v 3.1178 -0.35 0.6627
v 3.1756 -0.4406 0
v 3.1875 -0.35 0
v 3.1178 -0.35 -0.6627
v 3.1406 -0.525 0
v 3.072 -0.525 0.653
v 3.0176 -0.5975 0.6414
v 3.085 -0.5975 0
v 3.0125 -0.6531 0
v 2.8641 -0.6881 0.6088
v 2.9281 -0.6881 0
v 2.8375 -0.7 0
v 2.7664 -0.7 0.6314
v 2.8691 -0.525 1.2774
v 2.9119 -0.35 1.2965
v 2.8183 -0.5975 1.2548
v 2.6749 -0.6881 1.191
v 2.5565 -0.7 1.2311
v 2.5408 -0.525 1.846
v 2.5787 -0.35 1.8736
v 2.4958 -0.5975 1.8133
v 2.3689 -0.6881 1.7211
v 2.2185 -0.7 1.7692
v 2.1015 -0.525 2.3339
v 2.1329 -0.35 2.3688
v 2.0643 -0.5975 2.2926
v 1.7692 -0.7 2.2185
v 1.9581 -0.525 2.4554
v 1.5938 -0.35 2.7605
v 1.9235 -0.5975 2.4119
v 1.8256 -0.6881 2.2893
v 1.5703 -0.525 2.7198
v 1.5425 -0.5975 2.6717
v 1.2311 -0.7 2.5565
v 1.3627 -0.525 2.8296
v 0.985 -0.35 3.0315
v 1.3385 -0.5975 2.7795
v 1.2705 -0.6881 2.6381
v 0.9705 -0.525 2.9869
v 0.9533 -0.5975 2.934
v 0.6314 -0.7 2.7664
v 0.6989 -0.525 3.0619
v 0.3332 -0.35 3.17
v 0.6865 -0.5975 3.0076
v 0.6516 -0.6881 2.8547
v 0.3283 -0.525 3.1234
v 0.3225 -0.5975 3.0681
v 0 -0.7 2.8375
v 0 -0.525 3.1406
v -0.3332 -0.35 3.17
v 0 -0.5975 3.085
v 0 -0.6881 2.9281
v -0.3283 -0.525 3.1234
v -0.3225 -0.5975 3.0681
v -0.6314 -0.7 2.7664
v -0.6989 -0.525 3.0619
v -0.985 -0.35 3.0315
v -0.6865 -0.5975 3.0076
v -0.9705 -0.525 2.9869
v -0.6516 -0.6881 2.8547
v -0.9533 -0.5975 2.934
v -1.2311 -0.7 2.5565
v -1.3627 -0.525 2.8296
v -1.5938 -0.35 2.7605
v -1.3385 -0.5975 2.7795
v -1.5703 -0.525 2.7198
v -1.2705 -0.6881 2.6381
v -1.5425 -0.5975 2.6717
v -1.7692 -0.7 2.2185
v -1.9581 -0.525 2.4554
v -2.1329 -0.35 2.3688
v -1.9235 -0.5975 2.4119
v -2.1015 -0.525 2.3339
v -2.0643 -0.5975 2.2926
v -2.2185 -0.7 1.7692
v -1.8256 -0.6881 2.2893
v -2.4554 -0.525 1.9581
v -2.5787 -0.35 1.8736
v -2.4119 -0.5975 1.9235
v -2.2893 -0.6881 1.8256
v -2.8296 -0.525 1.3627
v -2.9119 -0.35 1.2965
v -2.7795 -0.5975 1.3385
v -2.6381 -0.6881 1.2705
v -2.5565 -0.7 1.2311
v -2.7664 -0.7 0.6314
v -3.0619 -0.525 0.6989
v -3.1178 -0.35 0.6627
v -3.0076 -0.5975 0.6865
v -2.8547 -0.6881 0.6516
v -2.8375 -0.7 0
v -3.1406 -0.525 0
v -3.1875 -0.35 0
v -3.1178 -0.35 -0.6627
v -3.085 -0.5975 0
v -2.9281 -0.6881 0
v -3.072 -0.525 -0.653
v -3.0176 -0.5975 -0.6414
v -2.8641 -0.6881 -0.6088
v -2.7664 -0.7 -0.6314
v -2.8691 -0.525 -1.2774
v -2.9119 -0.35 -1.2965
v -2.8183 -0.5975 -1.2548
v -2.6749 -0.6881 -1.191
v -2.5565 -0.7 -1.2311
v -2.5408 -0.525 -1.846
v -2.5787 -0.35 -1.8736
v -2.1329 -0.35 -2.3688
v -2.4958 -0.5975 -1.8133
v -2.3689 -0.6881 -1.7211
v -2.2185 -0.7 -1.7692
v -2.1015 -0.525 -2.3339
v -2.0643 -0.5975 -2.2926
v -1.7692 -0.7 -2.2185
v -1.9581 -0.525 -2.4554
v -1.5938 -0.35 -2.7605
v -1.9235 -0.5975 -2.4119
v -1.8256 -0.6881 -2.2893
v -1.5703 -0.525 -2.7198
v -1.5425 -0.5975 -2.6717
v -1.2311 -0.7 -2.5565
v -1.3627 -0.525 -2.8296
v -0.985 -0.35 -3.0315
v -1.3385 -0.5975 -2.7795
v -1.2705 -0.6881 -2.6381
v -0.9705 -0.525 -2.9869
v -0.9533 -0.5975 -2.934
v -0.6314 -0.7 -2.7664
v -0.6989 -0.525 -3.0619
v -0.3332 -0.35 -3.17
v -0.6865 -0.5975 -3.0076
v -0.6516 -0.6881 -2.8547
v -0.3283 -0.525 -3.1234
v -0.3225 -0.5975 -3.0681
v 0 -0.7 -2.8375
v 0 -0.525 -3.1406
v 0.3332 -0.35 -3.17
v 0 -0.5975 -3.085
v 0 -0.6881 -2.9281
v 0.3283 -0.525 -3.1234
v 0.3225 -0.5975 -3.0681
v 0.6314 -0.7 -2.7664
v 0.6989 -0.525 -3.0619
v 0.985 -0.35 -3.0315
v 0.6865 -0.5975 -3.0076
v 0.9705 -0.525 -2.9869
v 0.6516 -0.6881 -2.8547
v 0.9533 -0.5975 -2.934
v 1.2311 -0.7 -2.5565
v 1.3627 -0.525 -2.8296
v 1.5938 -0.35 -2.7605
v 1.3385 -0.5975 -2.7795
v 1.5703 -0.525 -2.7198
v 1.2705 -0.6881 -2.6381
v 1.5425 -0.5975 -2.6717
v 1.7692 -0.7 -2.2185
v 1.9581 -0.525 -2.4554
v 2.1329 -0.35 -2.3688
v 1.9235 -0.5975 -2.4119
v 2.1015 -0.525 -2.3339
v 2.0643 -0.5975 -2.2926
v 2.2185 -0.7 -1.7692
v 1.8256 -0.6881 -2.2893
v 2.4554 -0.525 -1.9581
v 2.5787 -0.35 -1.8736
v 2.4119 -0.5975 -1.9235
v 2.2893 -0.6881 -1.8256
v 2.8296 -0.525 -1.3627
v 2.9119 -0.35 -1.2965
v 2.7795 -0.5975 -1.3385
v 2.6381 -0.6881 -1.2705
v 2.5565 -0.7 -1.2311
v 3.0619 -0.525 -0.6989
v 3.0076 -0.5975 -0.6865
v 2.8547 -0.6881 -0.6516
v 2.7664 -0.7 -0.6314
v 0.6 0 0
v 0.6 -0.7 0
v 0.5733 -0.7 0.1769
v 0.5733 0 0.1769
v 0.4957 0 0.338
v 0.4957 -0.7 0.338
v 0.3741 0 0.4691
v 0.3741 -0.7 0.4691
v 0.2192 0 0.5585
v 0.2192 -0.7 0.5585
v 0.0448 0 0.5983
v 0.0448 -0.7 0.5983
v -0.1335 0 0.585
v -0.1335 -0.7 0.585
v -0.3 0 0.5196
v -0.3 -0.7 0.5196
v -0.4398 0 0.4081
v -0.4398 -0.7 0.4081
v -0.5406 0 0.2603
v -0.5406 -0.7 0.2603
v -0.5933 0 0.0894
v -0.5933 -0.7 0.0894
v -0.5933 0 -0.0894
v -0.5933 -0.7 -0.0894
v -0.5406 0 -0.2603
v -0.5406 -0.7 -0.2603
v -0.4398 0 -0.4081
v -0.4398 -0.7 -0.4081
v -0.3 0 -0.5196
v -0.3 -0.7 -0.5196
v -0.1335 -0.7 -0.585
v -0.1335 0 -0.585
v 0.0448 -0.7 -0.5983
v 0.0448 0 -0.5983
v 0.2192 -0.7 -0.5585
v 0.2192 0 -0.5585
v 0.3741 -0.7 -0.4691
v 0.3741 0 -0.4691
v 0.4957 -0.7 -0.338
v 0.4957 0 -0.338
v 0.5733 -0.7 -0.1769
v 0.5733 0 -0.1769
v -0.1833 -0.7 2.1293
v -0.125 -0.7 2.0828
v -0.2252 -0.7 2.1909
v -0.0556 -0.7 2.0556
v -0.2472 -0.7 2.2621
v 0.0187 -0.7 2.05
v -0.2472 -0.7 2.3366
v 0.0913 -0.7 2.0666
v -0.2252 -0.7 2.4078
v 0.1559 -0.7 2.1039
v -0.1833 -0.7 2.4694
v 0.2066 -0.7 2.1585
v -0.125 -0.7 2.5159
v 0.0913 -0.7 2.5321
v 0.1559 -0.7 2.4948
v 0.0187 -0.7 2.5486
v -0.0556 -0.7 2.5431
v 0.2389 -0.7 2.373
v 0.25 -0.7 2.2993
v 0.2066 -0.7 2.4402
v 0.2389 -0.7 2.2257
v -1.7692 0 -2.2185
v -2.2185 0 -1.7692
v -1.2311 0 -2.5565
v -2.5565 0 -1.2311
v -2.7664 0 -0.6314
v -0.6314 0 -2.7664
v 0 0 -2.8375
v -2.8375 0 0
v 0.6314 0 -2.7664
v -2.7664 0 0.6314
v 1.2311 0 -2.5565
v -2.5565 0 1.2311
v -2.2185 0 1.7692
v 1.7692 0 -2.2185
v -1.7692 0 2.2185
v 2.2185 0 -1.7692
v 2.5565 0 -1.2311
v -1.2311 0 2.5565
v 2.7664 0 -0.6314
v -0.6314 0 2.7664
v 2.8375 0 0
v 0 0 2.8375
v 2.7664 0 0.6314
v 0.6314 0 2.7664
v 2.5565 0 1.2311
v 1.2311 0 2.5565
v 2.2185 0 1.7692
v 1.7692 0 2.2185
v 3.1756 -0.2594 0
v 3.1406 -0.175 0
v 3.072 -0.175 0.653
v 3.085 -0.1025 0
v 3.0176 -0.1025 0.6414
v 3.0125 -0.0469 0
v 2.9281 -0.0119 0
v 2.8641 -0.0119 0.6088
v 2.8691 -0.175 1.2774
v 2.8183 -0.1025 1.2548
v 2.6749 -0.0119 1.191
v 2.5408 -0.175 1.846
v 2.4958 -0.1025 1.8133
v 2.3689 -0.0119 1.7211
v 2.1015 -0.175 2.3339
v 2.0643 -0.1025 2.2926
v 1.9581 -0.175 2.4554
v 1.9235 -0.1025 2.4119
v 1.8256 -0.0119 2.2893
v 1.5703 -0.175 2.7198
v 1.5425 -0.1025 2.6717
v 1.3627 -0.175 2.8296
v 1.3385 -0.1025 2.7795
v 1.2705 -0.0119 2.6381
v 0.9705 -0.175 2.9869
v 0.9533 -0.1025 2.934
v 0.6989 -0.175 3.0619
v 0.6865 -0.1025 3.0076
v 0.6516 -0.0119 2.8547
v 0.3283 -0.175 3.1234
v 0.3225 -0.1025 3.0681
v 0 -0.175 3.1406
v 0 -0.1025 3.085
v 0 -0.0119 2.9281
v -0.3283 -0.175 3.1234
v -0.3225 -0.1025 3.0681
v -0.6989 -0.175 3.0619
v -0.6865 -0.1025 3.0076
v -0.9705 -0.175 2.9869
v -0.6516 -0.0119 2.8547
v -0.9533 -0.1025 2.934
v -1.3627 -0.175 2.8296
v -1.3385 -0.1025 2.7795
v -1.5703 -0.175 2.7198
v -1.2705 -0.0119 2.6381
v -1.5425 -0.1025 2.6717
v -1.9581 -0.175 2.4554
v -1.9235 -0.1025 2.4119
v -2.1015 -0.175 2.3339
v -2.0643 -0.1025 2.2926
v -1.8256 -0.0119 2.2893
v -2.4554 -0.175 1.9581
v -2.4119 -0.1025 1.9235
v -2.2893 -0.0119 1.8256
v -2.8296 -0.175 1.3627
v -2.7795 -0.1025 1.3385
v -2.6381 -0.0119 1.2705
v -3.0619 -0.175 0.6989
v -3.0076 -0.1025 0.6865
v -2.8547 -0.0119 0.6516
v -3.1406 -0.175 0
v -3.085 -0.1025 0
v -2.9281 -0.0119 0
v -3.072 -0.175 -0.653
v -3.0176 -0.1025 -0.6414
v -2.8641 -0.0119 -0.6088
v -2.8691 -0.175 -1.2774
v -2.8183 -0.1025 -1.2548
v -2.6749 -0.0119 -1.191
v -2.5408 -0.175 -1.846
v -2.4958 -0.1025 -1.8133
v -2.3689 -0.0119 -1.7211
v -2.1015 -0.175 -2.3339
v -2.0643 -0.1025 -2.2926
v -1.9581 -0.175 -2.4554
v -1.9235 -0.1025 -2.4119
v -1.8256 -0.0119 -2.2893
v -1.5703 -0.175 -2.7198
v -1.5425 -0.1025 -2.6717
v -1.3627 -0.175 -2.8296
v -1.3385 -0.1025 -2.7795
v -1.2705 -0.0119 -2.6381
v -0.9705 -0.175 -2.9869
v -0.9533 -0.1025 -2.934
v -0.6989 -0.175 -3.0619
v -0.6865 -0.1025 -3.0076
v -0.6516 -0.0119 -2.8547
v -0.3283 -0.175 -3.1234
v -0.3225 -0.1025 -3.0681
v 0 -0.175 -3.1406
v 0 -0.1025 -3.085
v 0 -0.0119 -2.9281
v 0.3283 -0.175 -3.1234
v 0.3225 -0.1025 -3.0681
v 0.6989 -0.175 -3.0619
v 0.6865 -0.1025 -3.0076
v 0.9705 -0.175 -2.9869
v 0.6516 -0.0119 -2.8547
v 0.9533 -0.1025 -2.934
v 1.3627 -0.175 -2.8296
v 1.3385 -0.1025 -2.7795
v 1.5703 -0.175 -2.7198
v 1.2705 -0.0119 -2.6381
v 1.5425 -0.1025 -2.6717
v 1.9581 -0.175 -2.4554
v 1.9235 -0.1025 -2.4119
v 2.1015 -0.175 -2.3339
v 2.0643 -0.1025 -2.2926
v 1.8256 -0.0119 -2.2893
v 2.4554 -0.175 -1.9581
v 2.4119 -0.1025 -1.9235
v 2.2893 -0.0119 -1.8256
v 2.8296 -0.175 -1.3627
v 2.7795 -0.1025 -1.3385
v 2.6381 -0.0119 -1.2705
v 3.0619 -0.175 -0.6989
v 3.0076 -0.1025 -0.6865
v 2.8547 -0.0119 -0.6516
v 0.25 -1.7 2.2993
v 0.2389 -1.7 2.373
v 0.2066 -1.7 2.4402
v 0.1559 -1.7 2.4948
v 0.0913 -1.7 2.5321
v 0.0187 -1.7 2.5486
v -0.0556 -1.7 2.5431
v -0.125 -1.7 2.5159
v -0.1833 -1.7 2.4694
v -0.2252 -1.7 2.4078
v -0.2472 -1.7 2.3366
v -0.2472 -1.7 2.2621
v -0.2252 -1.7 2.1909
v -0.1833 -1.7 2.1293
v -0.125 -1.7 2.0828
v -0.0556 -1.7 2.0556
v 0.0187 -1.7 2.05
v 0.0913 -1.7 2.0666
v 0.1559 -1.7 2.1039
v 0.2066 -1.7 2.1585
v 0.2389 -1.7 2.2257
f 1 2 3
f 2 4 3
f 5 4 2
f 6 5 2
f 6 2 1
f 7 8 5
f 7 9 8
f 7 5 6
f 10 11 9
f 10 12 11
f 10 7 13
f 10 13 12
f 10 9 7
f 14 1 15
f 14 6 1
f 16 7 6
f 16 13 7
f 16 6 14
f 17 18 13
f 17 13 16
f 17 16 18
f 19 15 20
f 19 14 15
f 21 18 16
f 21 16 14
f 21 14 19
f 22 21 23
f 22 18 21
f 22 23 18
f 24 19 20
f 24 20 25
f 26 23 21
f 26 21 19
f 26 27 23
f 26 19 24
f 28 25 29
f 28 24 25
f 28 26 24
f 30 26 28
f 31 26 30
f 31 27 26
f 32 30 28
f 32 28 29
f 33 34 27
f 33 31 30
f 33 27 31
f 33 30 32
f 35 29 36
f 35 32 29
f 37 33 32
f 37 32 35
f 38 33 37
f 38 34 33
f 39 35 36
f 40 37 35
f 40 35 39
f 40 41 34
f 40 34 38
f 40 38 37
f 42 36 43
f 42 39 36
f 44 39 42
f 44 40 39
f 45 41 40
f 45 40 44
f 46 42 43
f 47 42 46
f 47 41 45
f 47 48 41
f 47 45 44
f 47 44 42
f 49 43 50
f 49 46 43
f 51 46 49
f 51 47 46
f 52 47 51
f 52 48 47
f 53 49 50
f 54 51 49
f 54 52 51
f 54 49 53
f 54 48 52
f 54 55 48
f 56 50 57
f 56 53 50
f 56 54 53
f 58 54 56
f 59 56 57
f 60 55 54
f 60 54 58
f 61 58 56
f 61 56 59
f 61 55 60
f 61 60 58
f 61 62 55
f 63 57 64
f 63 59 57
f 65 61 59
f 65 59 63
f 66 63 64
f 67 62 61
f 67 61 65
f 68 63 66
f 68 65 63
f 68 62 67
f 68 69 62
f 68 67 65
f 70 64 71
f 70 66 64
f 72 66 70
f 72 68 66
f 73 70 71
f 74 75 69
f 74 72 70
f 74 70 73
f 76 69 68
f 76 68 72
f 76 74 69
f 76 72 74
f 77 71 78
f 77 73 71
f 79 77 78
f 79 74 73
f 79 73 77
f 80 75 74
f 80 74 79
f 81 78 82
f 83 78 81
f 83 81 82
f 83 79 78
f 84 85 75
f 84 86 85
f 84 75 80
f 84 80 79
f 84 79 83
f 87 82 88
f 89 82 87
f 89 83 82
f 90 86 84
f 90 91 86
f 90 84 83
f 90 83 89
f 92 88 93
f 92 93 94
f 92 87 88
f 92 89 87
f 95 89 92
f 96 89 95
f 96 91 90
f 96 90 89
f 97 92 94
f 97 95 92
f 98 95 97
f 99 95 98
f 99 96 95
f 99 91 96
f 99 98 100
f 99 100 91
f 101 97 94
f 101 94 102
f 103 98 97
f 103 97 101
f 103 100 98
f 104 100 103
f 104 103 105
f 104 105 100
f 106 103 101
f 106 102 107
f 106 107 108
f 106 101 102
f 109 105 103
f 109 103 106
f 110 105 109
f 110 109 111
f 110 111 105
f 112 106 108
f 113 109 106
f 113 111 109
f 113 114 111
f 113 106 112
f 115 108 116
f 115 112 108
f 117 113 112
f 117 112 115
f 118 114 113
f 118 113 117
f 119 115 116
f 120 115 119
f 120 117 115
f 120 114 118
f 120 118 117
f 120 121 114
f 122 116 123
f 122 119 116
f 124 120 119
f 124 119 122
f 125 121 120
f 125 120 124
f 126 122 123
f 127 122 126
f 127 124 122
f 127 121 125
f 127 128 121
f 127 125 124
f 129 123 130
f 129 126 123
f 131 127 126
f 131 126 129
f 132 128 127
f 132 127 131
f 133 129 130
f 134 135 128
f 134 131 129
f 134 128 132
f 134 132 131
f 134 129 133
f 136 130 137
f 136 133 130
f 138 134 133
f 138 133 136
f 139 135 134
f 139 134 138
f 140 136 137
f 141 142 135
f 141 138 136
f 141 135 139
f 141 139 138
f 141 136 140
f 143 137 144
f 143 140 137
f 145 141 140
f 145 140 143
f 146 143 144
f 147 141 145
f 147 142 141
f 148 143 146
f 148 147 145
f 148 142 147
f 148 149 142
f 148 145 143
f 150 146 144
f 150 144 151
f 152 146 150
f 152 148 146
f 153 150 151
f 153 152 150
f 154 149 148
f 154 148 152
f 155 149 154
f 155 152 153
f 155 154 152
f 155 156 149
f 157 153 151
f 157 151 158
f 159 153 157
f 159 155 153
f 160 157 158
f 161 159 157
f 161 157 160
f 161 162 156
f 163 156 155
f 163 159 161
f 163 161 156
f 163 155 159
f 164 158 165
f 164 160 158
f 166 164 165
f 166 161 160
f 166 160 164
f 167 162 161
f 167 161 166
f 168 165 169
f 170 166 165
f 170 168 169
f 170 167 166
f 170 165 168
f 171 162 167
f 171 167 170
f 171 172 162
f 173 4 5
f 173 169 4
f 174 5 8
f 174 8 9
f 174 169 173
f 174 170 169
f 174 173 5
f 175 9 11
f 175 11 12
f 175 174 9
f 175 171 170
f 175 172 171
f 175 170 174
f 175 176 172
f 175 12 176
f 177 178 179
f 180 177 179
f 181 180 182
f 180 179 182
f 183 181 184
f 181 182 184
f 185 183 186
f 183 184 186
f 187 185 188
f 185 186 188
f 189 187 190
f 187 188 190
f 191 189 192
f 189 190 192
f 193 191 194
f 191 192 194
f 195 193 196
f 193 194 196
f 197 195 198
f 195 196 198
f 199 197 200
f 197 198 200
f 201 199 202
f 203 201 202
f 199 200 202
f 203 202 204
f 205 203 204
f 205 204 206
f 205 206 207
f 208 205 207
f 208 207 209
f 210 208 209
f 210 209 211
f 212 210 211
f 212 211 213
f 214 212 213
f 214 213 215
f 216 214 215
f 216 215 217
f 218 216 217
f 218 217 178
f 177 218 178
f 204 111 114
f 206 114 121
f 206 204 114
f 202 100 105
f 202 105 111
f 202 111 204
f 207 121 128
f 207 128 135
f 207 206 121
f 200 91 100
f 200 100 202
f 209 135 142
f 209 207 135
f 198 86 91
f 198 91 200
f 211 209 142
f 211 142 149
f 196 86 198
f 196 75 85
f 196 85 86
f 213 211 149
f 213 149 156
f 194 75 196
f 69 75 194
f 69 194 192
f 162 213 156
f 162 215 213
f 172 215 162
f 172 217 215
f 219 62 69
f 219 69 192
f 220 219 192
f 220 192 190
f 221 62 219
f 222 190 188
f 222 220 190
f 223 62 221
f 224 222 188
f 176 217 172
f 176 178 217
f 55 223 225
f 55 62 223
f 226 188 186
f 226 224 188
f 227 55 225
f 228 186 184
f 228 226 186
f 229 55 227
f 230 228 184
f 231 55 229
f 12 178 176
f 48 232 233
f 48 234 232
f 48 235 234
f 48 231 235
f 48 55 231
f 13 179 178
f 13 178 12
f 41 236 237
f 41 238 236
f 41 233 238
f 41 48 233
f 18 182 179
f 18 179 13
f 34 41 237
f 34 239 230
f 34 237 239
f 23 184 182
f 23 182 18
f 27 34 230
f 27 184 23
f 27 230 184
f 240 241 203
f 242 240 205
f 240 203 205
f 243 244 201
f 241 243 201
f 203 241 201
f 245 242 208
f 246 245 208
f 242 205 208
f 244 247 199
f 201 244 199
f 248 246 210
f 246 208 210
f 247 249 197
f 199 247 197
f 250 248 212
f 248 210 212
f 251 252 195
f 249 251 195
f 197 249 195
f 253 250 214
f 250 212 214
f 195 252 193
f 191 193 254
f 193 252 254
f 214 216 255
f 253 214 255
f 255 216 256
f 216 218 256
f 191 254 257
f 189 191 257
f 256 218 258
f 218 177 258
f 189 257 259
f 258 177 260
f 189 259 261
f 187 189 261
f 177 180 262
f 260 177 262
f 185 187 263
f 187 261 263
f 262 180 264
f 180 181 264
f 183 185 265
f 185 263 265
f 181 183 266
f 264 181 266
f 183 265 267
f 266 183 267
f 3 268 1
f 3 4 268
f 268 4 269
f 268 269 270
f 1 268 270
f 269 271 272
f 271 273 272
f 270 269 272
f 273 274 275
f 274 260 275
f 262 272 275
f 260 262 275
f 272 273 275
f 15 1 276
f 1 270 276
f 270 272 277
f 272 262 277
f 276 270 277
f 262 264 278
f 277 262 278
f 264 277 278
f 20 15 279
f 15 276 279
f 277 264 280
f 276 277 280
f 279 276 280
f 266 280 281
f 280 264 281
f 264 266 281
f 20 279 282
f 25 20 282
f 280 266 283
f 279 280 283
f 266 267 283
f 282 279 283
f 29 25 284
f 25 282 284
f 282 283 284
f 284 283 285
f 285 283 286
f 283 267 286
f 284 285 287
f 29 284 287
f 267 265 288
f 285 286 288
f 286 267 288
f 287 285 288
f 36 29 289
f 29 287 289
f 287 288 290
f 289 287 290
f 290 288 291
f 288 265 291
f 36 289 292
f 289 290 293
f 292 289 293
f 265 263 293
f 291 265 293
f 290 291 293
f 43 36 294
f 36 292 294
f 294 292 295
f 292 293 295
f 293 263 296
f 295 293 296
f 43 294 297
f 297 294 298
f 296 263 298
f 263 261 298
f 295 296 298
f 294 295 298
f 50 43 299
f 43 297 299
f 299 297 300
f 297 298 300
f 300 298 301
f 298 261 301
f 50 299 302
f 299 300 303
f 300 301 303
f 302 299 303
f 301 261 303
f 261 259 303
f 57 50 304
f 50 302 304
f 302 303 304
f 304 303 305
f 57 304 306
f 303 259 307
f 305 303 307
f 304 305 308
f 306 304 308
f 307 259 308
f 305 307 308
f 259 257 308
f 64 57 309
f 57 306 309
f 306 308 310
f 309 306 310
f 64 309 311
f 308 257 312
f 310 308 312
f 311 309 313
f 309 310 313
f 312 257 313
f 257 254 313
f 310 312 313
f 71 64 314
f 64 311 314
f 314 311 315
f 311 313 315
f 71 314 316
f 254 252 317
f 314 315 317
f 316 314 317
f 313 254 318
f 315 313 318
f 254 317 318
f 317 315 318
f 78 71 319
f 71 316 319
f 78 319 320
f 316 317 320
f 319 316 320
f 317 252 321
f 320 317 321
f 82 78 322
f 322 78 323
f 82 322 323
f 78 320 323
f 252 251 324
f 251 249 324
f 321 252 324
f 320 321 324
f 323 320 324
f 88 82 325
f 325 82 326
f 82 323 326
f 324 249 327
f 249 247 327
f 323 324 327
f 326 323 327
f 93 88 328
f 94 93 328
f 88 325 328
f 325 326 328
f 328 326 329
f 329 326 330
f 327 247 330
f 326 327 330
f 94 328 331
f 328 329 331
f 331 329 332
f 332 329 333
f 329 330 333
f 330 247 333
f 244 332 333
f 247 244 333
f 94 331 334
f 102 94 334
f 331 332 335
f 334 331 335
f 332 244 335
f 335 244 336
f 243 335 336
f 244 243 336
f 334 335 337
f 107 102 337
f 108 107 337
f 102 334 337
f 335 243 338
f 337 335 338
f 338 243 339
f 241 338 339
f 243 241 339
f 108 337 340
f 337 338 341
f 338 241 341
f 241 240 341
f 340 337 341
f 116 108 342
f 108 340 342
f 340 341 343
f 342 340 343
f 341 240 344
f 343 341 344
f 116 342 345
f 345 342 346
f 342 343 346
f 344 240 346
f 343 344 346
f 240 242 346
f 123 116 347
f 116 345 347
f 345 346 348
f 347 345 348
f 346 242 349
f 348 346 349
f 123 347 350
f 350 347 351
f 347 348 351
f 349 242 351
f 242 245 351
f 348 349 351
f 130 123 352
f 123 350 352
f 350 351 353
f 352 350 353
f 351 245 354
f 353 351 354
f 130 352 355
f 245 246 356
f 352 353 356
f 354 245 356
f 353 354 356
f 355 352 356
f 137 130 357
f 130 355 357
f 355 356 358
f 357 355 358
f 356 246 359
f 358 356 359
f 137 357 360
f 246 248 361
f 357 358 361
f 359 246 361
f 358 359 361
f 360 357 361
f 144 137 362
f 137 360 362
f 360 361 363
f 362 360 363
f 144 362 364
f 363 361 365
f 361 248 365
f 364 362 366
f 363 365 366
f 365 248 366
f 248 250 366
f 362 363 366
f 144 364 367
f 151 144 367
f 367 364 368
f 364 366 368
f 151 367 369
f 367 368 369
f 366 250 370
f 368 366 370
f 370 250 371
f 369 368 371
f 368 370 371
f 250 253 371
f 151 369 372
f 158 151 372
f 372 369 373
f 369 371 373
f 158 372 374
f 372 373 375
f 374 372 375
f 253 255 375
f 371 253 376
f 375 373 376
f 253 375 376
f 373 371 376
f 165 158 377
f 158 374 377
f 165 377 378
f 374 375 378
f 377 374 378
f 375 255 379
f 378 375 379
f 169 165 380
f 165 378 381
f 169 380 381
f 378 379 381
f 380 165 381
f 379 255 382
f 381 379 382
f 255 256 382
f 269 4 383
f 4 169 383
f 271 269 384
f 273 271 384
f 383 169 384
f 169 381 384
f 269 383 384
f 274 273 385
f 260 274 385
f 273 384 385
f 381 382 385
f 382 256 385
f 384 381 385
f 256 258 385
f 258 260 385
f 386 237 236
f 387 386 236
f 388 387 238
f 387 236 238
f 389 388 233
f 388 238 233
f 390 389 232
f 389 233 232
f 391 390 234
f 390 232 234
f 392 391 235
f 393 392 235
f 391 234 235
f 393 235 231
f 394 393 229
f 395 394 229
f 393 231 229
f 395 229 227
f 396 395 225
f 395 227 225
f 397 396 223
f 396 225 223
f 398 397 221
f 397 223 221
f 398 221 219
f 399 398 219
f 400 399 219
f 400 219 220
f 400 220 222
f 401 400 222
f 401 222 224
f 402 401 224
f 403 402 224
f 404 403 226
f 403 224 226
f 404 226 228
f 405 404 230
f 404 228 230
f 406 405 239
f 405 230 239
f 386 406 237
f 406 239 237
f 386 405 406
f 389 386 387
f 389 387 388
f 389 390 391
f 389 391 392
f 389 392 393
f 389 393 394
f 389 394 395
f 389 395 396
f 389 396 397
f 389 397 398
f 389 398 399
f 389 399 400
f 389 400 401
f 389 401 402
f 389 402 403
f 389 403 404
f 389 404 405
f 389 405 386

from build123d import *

# Parameters (mm, degrees)
F0_R     = 3.1875
F1_DEPTH = 0.7
F2_R     = 0.6
F3_DEPTH = 25
F4_R     = 0.34999
F5_R     = 0.25
F6_DEPTH = 1


# Not quite as in the source:
# - a fillet or chamfer is up to 0.001 mm smaller than in the source, because OpenCascade refuses the exact size


with BuildPart() as f1:
    # F0 (on Front) → F1 (new body)
    with BuildSketch(Plane.XZ):
        Circle(F0_R)
    extrude(amount=F1_DEPTH)

    # F2 (on face) → F3 (cut)
    with BuildSketch(Plane.XZ.offset(0.7)):
        Circle(F2_R)
    extrude(amount=-F3_DEPTH, mode=Mode.SUBTRACT)

    # F4 (radius 0.35 in the source; OpenCascade refuses exactly that, so slightly less here)
    f4_edges = [f1.edges().sort_by_distance(p)[0] for p in [
        (3.1875, -0.35, 0),
        (-3.1875, 0, 0),
        (-3.1875, -0.7, 0),
    ]]
    fillet(f4_edges, radius=F4_R)

    # F5 (on face) → F6 (join)
    with BuildSketch(Plane.XZ.offset(0.7)):
        with Locations((0, 2.2993473568)):
            Circle(F5_R)
    extrude(amount=F6_DEPTH)


solid = f1.part
